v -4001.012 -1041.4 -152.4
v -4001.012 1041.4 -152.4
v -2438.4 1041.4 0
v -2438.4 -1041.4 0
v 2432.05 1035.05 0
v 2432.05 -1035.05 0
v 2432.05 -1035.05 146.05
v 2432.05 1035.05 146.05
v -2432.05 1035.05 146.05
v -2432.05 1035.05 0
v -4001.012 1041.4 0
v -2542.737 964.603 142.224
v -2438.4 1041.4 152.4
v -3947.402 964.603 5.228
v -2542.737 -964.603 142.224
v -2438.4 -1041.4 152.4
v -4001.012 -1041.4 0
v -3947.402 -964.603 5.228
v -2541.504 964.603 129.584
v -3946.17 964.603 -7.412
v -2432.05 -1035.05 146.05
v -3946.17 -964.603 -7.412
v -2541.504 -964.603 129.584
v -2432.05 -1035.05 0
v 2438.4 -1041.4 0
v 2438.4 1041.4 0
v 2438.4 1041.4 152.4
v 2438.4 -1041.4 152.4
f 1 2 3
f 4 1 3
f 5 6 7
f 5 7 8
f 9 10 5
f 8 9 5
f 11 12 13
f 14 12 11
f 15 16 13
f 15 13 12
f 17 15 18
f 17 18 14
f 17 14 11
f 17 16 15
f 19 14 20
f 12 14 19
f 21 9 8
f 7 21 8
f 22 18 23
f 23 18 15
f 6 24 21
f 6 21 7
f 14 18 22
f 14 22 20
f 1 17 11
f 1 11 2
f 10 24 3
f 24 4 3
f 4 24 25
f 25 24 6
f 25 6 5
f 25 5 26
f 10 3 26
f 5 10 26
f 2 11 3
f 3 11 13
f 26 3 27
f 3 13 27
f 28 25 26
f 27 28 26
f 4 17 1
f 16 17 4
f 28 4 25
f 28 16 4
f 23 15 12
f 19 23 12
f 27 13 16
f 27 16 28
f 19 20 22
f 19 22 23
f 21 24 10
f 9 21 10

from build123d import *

# Parameters (mm, degrees)
F0_W     = 4876.8
F0_H     = 2082.8
F1_DEPTH = 152.4
F2_T     = -6.35
F4_DEPTH = 1041.4
F5_W     = 1411.3302230835
F5_H     = 1929.2058944702
F6_DEPTH = 12.7


with BuildPart() as f1:
    # F0 (on Top) → F1 (new body)
    with BuildSketch(Plane.XY):
        Rectangle(F0_W, F0_H)
    extrude(amount=F1_DEPTH)

    # F2
    f2_openings = [f1.faces().sort_by_distance(p)[0] for p in [
        (0, 0, 0),
    ]]
    offset(amount=F2_T, openings=f2_openings)

    # F3 (on Front) → F4 (join, symmetric)
    with BuildSketch(Plane.XZ):
        Polygon((-2438.4, 0), (-2438.4, 152.4), (-4001.0118484497, 0), (-4001.0118484497, -152.4), align=None)
    extrude(amount=F4_DEPTH, both=True)

    # F5 (on face) → F6 (cut)
    with BuildSketch(Plane(origin=(-37.6986760774, 0, 386.5380440247), x_dir=(0.9952777072, 0, 0.097068458), z_dir=(-0.097068458, 0, 0.9952777072))):
        with Locations((-3222.5890159607, 0)):
            Rectangle(F5_W, F5_H)
    extrude(amount=-F6_DEPTH, mode=Mode.SUBTRACT)


solid = f1.part
